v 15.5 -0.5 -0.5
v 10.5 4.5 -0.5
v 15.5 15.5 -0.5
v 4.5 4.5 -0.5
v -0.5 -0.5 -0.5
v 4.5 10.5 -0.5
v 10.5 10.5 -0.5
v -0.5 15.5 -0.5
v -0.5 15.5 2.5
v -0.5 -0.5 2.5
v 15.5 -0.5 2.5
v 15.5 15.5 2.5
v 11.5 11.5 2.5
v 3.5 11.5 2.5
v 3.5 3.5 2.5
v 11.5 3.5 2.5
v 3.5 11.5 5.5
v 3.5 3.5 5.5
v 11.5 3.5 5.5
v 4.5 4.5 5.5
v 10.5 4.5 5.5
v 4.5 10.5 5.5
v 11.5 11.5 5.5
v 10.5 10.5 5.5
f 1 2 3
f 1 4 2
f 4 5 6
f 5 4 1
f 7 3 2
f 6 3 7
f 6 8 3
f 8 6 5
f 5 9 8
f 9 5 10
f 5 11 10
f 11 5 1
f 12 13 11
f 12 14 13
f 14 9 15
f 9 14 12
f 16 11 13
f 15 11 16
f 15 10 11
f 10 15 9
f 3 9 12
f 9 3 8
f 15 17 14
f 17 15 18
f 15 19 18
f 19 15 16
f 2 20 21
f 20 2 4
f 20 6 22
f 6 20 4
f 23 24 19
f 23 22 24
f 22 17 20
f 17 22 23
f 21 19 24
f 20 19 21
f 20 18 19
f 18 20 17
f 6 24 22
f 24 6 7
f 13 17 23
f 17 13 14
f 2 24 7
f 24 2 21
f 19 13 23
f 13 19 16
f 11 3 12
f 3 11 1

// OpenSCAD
union() {
    translate([0, 0, 0]) color("brown") cube([1, 1, 1],center=true);
    translate([0, 0, 1]) color("brown") cube([1, 1, 1],center=true);
    translate([0, 0, 2]) color("brown") cube([1, 1, 1],center=true);
    translate([0, 1, 0]) color("brown") cube([1, 1, 1],center=true);
    translate([0, 1, 1]) color("brown") cube([1, 1, 1],center=true);
    translate([0, 1, 2]) color("brown") cube([1, 1, 1],center=true);
    translate([0, 2, 0]) color("brown") cube([1, 1, 1],center=true);
    translate([0, 2, 1]) color("brown") cube([1, 1, 1],center=true);
    translate([0, 2, 2]) color("brown") cube([1, 1, 1],center=true);
    translate([0, 3, 0]) color("brown") cube([1, 1, 1],center=true);
    translate([0, 3, 1]) color("brown") cube([1, 1, 1],center=true);
    translate([0, 3, 2]) color("brown") cube([1, 1, 1],center=true);
    translate([0, 4, 0]) color("brown") cube([1, 1, 1],center=true);
    translate([0, 4, 1]) color("brown") cube([1, 1, 1],center=true);
    translate([0, 4, 2]) color("brown") cube([1, 1, 1],center=true);
    translate([0, 5, 0]) color("brown") cube([1, 1, 1],center=true);
    translate([0, 5, 1]) color("brown") cube([1, 1, 1],center=true);
    translate([0, 5, 2]) color("brown") cube([1, 1, 1],center=true);
    translate([0, 6, 0]) color("brown") cube([1, 1, 1],center=true);
    translate([0, 6, 1]) color("brown") cube([1, 1, 1],center=true);
    translate([0, 6, 2]) color("brown") cube([1, 1, 1],center=true);
    translate([0, 7, 0]) color("brown") cube([1, 1, 1],center=true);
    translate([0, 7, 1]) color("brown") cube([1, 1, 1],center=true);
    translate([0, 7, 2]) color("brown") cube([1, 1, 1],center=true);
    translate([0, 8, 0]) color("brown") cube([1, 1, 1],center=true);
    translate([0, 8, 1]) color("brown") cube([1, 1, 1],center=true);
    translate([0, 8, 2]) color("brown") cube([1, 1, 1],center=true);
    translate([0, 9, 0]) color("brown") cube([1, 1, 1],center=true);
    translate([0, 9, 1]) color("brown") cube([1, 1, 1],center=true);
    translate([0, 9, 2]) color("brown") cube([1, 1, 1],center=true);
    translate([0, 10, 0]) color("brown") cube([1, 1, 1],center=true);
    translate([0, 10, 1]) color("brown") cube([1, 1, 1],center=true);
    translate([0, 10, 2]) color("brown") cube([1, 1, 1],center=true);
    translate([0, 11, 0]) color("brown") cube([1, 1, 1],center=true);
    translate([0, 11, 1]) color("brown") cube([1, 1, 1],center=true);
    translate([0, 11, 2]) color("brown") cube([1, 1, 1],center=true);
    translate([0, 12, 0]) color("brown") cube([1, 1, 1],center=true);
    translate([0, 12, 1]) color("brown") cube([1, 1, 1],center=true);
    translate([0, 12, 2]) color("brown") cube([1, 1, 1],center=true);
    translate([0, 13, 0]) color("brown") cube([1, 1, 1],center=true);
    translate([0, 13, 1]) color("brown") cube([1, 1, 1],center=true);
    translate([0, 13, 2]) color("brown") cube([1, 1, 1],center=true);
    translate([0, 14, 0]) color("brown") cube([1, 1, 1],center=true);
    translate([0, 14, 1]) color("brown") cube([1, 1, 1],center=true);
    translate([0, 14, 2]) color("brown") cube([1, 1, 1],center=true);
    translate([0, 15, 0]) color("brown") cube([1, 1, 1],center=true);
    translate([0, 15, 1]) color("brown") cube([1, 1, 1],center=true);
    translate([0, 15, 2]) color("brown") cube([1, 1, 1],center=true);
    translate([1, 0, 0]) color("brown") cube([1, 1, 1],center=true);
    translate([1, 0, 1]) color("brown") cube([1, 1, 1],center=true);
    translate([1, 0, 2]) color("brown") cube([1, 1, 1],center=true);
    translate([1, 1, 0]) color("brown") cube([1, 1, 1],center=true);
    translate([1, 1, 1]) color("brown") cube([1, 1, 1],center=true);
    translate([1, 1, 2]) color("brown") cube([1, 1, 1],center=true);
    translate([1, 2, 0]) color("brown") cube([1, 1, 1],center=true);
    translate([1, 2, 1]) color("brown") cube([1, 1, 1],center=true);
    translate([1, 2, 2]) color("brown") cube([1, 1, 1],center=true);
    translate([1, 3, 0]) color("brown") cube([1, 1, 1],center=true);
    translate([1, 3, 1]) color("brown") cube([1, 1, 1],center=true);
    translate([1, 3, 2]) color("brown") cube([1, 1, 1],center=true);
    translate([1, 4, 0]) color("brown") cube([1, 1, 1],center=true);
    translate([1, 4, 1]) color("brown") cube([1, 1, 1],center=true);
    translate([1, 4, 2]) color("brown") cube([1, 1, 1],center=true);
    translate([1, 5, 0]) color("brown") cube([1, 1, 1],center=true);
    translate([1, 5, 1]) color("brown") cube([1, 1, 1],center=true);
    translate([1, 5, 2]) color("brown") cube([1, 1, 1],center=true);
    translate([1, 6, 0]) color("brown") cube([1, 1, 1],center=true);
    translate([1, 6, 1]) color("brown") cube([1, 1, 1],center=true);
    translate([1, 6, 2]) color("brown") cube([1, 1, 1],center=true);
    translate([1, 7, 0]) color("brown") cube([1, 1, 1],center=true);
    translate([1, 7, 1]) color("brown") cube([1, 1, 1],center=true);
    translate([1, 7, 2]) color("brown") cube([1, 1, 1],center=true);
    translate([1, 8, 0]) color("brown") cube([1, 1, 1],center=true);
    translate([1, 8, 1]) color("brown") cube([1, 1, 1],center=true);
    translate([1, 8, 2]) color("brown") cube([1, 1, 1],center=true);
    translate([1, 9, 0]) color("brown") cube([1, 1, 1],center=true);
    translate([1, 9, 1]) color("brown") cube([1, 1, 1],center=true);
    translate([1, 9, 2]) color("brown") cube([1, 1, 1],center=true);
    translate([1, 10, 0]) color("brown") cube([1, 1, 1],center=true);
    translate([1, 10, 1]) color("brown") cube([1, 1, 1],center=true);
    translate([1, 10, 2]) color("brown") cube([1, 1, 1],center=true);
    translate([1, 11, 0]) color("brown") cube([1, 1, 1],center=true);
    translate([1, 11, 1]) color("brown") cube([1, 1, 1],center=true);
    translate([1, 11, 2]) color("brown") cube([1, 1, 1],center=true);
    translate([1, 12, 0]) color("brown") cube([1, 1, 1],center=true);
    translate([1, 12, 1]) color("brown") cube([1, 1, 1],center=true);
    translate([1, 12, 2]) color("brown") cube([1, 1, 1],center=true);
    translate([1, 13, 0]) color("brown") cube([1, 1, 1],center=true);
    translate([1, 13, 1]) color("brown") cube([1, 1, 1],center=true);
    translate([1, 13, 2]) color("brown") cube([1, 1, 1],center=true);
    translate([1, 14, 0]) color("brown") cube([1, 1, 1],center=true);
    translate([1, 14, 1]) color("brown") cube([1, 1, 1],center=true);
    translate([1, 14, 2]) color("brown") cube([1, 1, 1],center=true);
    translate([1, 15, 0]) color("brown") cube([1, 1, 1],center=true);
    translate([1, 15, 1]) color("brown") cube([1, 1, 1],center=true);
    translate([1, 15, 2]) color("brown") cube([1, 1, 1],center=true);
    translate([2, 0, 0]) color("brown") cube([1, 1, 1],center=true);
    translate([2, 0, 1]) color("brown") cube([1, 1, 1],center=true);
    translate([2, 0, 2]) color("brown") cube([1, 1, 1],center=true);
    translate([2, 1, 0]) color("brown") cube([1, 1, 1],center=true);
    translate([2, 1, 1]) color("brown") cube([1, 1, 1],center=true);
    translate([2, 1, 2]) color("brown") cube([1, 1, 1],center=true);
    translate([2, 2, 0]) color("brown") cube([1, 1, 1],center=true);
    translate([2, 2, 1]) color("brown") cube([1, 1, 1],center=true);
    translate([2, 2, 2]) color("brown") cube([1, 1, 1],center=true);
    translate([2, 3, 0]) color("brown") cube([1, 1, 1],center=true);
    translate([2, 3, 1]) color("brown") cube([1, 1, 1],center=true);
    translate([2, 3, 2]) color("brown") cube([1, 1, 1],center=true);
    translate([2, 4, 0]) color("brown") cube([1, 1, 1],center=true);
    translate([2, 4, 1]) color("brown") cube([1, 1, 1],center=true);
    translate([2, 4, 2]) color("brown") cube([1, 1, 1],center=true);
    translate([2, 5, 0]) color("brown") cube([1, 1, 1],center=true);
    translate([2, 5, 1]) color("brown") cube([1, 1, 1],center=true);
    translate([2, 5, 2]) color("brown") cube([1, 1, 1],center=true);
    translate([2, 6, 0]) color("brown") cube([1, 1, 1],center=true);
    translate([2, 6, 1]) color("brown") cube([1, 1, 1],center=true);
    translate([2, 6, 2]) color("brown") cube([1, 1, 1],center=true);
    translate([2, 7, 0]) color("brown") cube([1, 1, 1],center=true);
    translate([2, 7, 1]) color("brown") cube([1, 1, 1],center=true);
    translate([2, 7, 2]) color("brown") cube([1, 1, 1],center=true);
    translate([2, 8, 0]) color("brown") cube([1, 1, 1],center=true);
    translate([2, 8, 1]) color("brown") cube([1, 1, 1],center=true);
    translate([2, 8, 2]) color("brown") cube([1, 1, 1],center=true);
    translate([2, 9, 0]) color("brown") cube([1, 1, 1],center=true);
    translate([2, 9, 1]) color("brown") cube([1, 1, 1],center=true);
    translate([2, 9, 2]) color("brown") cube([1, 1, 1],center=true);
    translate([2, 10, 0]) color("brown") cube([1, 1, 1],center=true);
    translate([2, 10, 1]) color("brown") cube([1, 1, 1],center=true);
    translate([2, 10, 2]) color("brown") cube([1, 1, 1],center=true);
    translate([2, 11, 0]) color("brown") cube([1, 1, 1],center=true);
    translate([2, 11, 1]) color("brown") cube([1, 1, 1],center=true);
    translate([2, 11, 2]) color("brown") cube([1, 1, 1],center=true);
    translate([2, 12, 0]) color("brown") cube([1, 1, 1],center=true);
    translate([2, 12, 1]) color("brown") cube([1, 1, 1],center=true);
    translate([2, 12, 2]) color("brown") cube([1, 1, 1],center=true);
    translate([2, 13, 0]) color("brown") cube([1, 1, 1],center=true);
    translate([2, 13, 1]) color("brown") cube([1, 1, 1],center=true);
    translate([2, 13, 2]) color("brown") cube([1, 1, 1],center=true);
    translate([2, 14, 0]) color("brown") cube([1, 1, 1],center=true);
    translate([2, 14, 1]) color("brown") cube([1, 1, 1],center=true);
    translate([2, 14, 2]) color("brown") cube([1, 1, 1],center=true);
    translate([2, 15, 0]) color("brown") cube([1, 1, 1],center=true);
    translate([2, 15, 1]) color("brown") cube([1, 1, 1],center=true);
    translate([2, 15, 2]) color("brown") cube([1, 1, 1],center=true);
    translate([3, 0, 0]) color("brown") cube([1, 1, 1],center=true);
    translate([3, 0, 1]) color("brown") cube([1, 1, 1],center=true);
    translate([3, 0, 2]) color("brown") cube([1, 1, 1],center=true);
    translate([3, 1, 0]) color("brown") cube([1, 1, 1],center=true);
    translate([3, 1, 1]) color("brown") cube([1, 1, 1],center=true);
    translate([3, 1, 2]) color("brown") cube([1, 1, 1],center=true);
    translate([3, 2, 0]) color("brown") cube([1, 1, 1],center=true);
    translate([3, 2, 1]) color("brown") cube([1, 1, 1],center=true);
    translate([3, 2, 2]) color("brown") cube([1, 1, 1],center=true);
    translate([3, 3, 0]) color("brown") cube([1, 1, 1],center=true);
    translate([3, 3, 1]) color("brown") cube([1, 1, 1],center=true);
    translate([3, 3, 2]) color("brown") cube([1, 1, 1],center=true);
    translate([3, 4, 0]) color("brown") cube([1, 1, 1],center=true);
    translate([3, 4, 1]) color("brown") cube([1, 1, 1],center=true);
    translate([3, 4, 2]) color("brown") cube([1, 1, 1],center=true);
    translate([3, 5, 0]) color("brown") cube([1, 1, 1],center=true);
    translate([3, 5, 1]) color("brown") cube([1, 1, 1],center=true);
    translate([3, 5, 2]) color("brown") cube([1, 1, 1],center=true);
    translate([3, 6, 0]) color("brown") cube([1, 1, 1],center=true);
    translate([3, 6, 1]) color("brown") cube([1, 1, 1],center=true);
    translate([3, 6, 2]) color("brown") cube([1, 1, 1],center=true);
    translate([3, 7, 0]) color("brown") cube([1, 1, 1],center=true);
    translate([3, 7, 1]) color("brown") cube([1, 1, 1],center=true);
    translate([3, 7, 2]) color("brown") cube([1, 1, 1],center=true);
    translate([3, 8, 0]) color("brown") cube([1, 1, 1],center=true);
    translate([3, 8, 1]) color("brown") cube([1, 1, 1],center=true);
    translate([3, 8, 2]) color("brown") cube([1, 1, 1],center=true);
    translate([3, 9, 0]) color("brown") cube([1, 1, 1],center=true);
    translate([3, 9, 1]) color("brown") cube([1, 1, 1],center=true);
    translate([3, 9, 2]) color("brown") cube([1, 1, 1],center=true);
    translate([3, 10, 0]) color("brown") cube([1, 1, 1],center=true);
    translate([3, 10, 1]) color("brown") cube([1, 1, 1],center=true);
    translate([3, 10, 2]) color("brown") cube([1, 1, 1],center=true);
    translate([3, 11, 0]) color("brown") cube([1, 1, 1],center=true);
    translate([3, 11, 1]) color("brown") cube([1, 1, 1],center=true);
    translate([3, 11, 2]) color("brown") cube([1, 1, 1],center=true);
    translate([3, 12, 0]) color("brown") cube([1, 1, 1],center=true);
    translate([3, 12, 1]) color("brown") cube([1, 1, 1],center=true);
    translate([3, 12, 2]) color("brown") cube([1, 1, 1],center=true);
    translate([3, 13, 0]) color("brown") cube([1, 1, 1],center=true);
    translate([3, 13, 1]) color("brown") cube([1, 1, 1],center=true);
    translate([3, 13, 2]) color("brown") cube([1, 1, 1],center=true);
    translate([3, 14, 0]) color("brown") cube([1, 1, 1],center=true);
    translate([3, 14, 1]) color("brown") cube([1, 1, 1],center=true);
    translate([3, 14, 2]) color("brown") cube([1, 1, 1],center=true);
    translate([3, 15, 0]) color("brown") cube([1, 1, 1],center=true);
    translate([3, 15, 1]) color("brown") cube([1, 1, 1],center=true);
    translate([3, 15, 2]) color("brown") cube([1, 1, 1],center=true);
    translate([4, 0, 0]) color("brown") cube([1, 1, 1],center=true);
    translate([4, 0, 1]) color("brown") cube([1, 1, 1],center=true);
    translate([4, 0, 2]) color("brown") cube([1, 1, 1],center=true);
    translate([4, 1, 0]) color("brown") cube([1, 1, 1],center=true);
    translate([4, 1, 1]) color("brown") cube([1, 1, 1],center=true);
    translate([4, 1, 2]) color("brown") cube([1, 1, 1],center=true);
    translate([4, 2, 0]) color("brown") cube([1, 1, 1],center=true);
    translate([4, 2, 1]) color("brown") cube([1, 1, 1],center=true);
    translate([4, 2, 2]) color("brown") cube([1, 1, 1],center=true);
    translate([4, 3, 0]) color("brown") cube([1, 1, 1],center=true);
    translate([4, 3, 1]) color("brown") cube([1, 1, 1],center=true);
    translate([4, 3, 2]) color("brown") cube([1, 1, 1],center=true);
    translate([4, 4, 0]) color("brown") cube([1, 1, 1],center=true);
    translate([4, 4, 1]) color("brown") cube([1, 1, 1],center=true);
    translate([4, 4, 2]) color("brown") cube([1, 1, 1],center=true);
    translate([4, 4, 3]) color("brown") cube([1, 1, 1],center=true);
    translate([4, 4, 4]) color("brown") cube([1, 1, 1],center=true);
    translate([4, 4, 5]) color("brown") cube([1, 1, 1],center=true);
    translate([4, 5, 0]) color("brown") cube([1, 1, 1],center=true);
    translate([4, 5, 1]) color("brown") cube([1, 1, 1],center=true);
    translate([4, 5, 2]) color("brown") cube([1, 1, 1],center=true);
    translate([4, 5, 3]) color("brown") cube([1, 1, 1],center=true);
    translate([4, 5, 4]) color("brown") cube([1, 1, 1],center=true);
    translate([4, 5, 5]) color("brown") cube([1, 1, 1],center=true);
    translate([4, 6, 0]) color("brown") cube([1, 1, 1],center=true);
    translate([4, 6, 1]) color("brown") cube([1, 1, 1],center=true);
    translate([4, 6, 2]) color("brown") cube([1, 1, 1],center=true);
    translate([4, 6, 3]) color("brown") cube([1, 1, 1],center=true);
    translate([4, 6, 4]) color("brown") cube([1, 1, 1],center=true);
    translate([4, 6, 5]) color("brown") cube([1, 1, 1],center=true);
    translate([4, 7, 0]) color("brown") cube([1, 1, 1],center=true);
    translate([4, 7, 1]) color("brown") cube([1, 1, 1],center=true);
    translate([4, 7, 2]) color("brown") cube([1, 1, 1],center=true);
    translate([4, 7, 3]) color("brown") cube([1, 1, 1],center=true);
    translate([4, 7, 4]) color("brown") cube([1, 1, 1],center=true);
    translate([4, 7, 5]) color("brown") cube([1, 1, 1],center=true);
    translate([4, 8, 0]) color("brown") cube([1, 1, 1],center=true);
    translate([4, 8, 1]) color("brown") cube([1, 1, 1],center=true);
    translate([4, 8, 2]) color("brown") cube([1, 1, 1],center=true);
    translate([4, 8, 3]) color("brown") cube([1, 1, 1],center=true);
    translate([4, 8, 4]) color("brown") cube([1, 1, 1],center=true);
    translate([4, 8, 5]) color("brown") cube([1, 1, 1],center=true);
    translate([4, 9, 0]) color("brown") cube([1, 1, 1],center=true);
    translate([4, 9, 1]) color("brown") cube([1, 1, 1],center=true);
    translate([4, 9, 2]) color("brown") cube([1, 1, 1],center=true);
    translate([4, 9, 3]) color("brown") cube([1, 1, 1],center=true);
    translate([4, 9, 4]) color("brown") cube([1, 1, 1],center=true);
    translate([4, 9, 5]) color("brown") cube([1, 1, 1],center=true);
    translate([4, 10, 0]) color("brown") cube([1, 1, 1],center=true);
    translate([4, 10, 1]) color("brown") cube([1, 1, 1],center=true);
    translate([4, 10, 2]) color("brown") cube([1, 1, 1],center=true);
    translate([4, 10, 3]) color("brown") cube([1, 1, 1],center=true);
    translate([4, 10, 4]) color("brown") cube([1, 1, 1],center=true);
    translate([4, 10, 5]) color("brown") cube([1, 1, 1],center=true);
    translate([4, 11, 0]) color("brown") cube([1, 1, 1],center=true);
    translate([4, 11, 1]) color("brown") cube([1, 1, 1],center=true);
    translate([4, 11, 2]) color("brown") cube([1, 1, 1],center=true);
    translate([4, 11, 3]) color("brown") cube([1, 1, 1],center=true);
    translate([4, 11, 4]) color("brown") cube([1, 1, 1],center=true);
    translate([4, 11, 5]) color("brown") cube([1, 1, 1],center=true);
    translate([4, 12, 0]) color("brown") cube([1, 1, 1],center=true);
    translate([4, 12, 1]) color("brown") cube([1, 1, 1],center=true);
    translate([4, 12, 2]) color("brown") cube([1, 1, 1],center=true);
    translate([4, 13, 0]) color("brown") cube([1, 1, 1],center=true);
    translate([4, 13, 1]) color("brown") cube([1, 1, 1],center=true);
    translate([4, 13, 2]) color("brown") cube([1, 1, 1],center=true);
    translate([4, 14, 0]) color("brown") cube([1, 1, 1],center=true);
    translate([4, 14, 1]) color("brown") cube([1, 1, 1],center=true);
    translate([4, 14, 2]) color("brown") cube([1, 1, 1],center=true);
    translate([4, 15, 0]) color("brown") cube([1, 1, 1],center=true);
    translate([4, 15, 1]) color("brown") cube([1, 1, 1],center=true);
    translate([4, 15, 2]) color("brown") cube([1, 1, 1],center=true);
    translate([5, 0, 0]) color("brown") cube([1, 1, 1],center=true);
    translate([5, 0, 1]) color("brown") cube([1, 1, 1],center=true);
    translate([5, 0, 2]) color("brown") cube([1, 1, 1],center=true);
    translate([5, 1, 0]) color("brown") cube([1, 1, 1],center=true);
    translate([5, 1, 1]) color("brown") cube([1, 1, 1],center=true);
    translate([5, 1, 2]) color("brown") cube([1, 1, 1],center=true);
    translate([5, 2, 0]) color("brown") cube([1, 1, 1],center=true);
    translate([5, 2, 1]) color("brown") cube([1, 1, 1],center=true);
    translate([5, 2, 2]) color("brown") cube([1, 1, 1],center=true);
    translate([5, 3, 0]) color("brown") cube([1, 1, 1],center=true);
    translate([5, 3, 1]) color("brown") cube([1, 1, 1],center=true);
    translate([5, 3, 2]) color("brown") cube([1, 1, 1],center=true);
    translate([5, 4, 0]) color("brown") cube([1, 1, 1],center=true);
    translate([5, 4, 1]) color("brown") cube([1, 1, 1],center=true);
    translate([5, 4, 2]) color("brown") cube([1, 1, 1],center=true);
    translate([5, 4, 3]) color("brown") cube([1, 1, 1],center=true);
    translate([5, 4, 4]) color("brown") cube([1, 1, 1],center=true);
    translate([5, 4, 5]) color("brown") cube([1, 1, 1],center=true);
    translate([5, 11, 0]) color("brown") cube([1, 1, 1],center=true);
    translate([5, 11, 1]) color("brown") cube([1, 1, 1],center=true);
    translate([5, 11, 2]) color("brown") cube([1, 1, 1],center=true);
    translate([5, 11, 3]) color("brown") cube([1, 1, 1],center=true);
    translate([5, 11, 4]) color("brown") cube([1, 1, 1],center=true);
    translate([5, 11, 5]) color("brown") cube([1, 1, 1],center=true);
    translate([5, 12, 0]) color("brown") cube([1, 1, 1],center=true);
    translate([5, 12, 1]) color("brown") cube([1, 1, 1],center=true);
    translate([5, 12, 2]) color("brown") cube([1, 1, 1],center=true);
    translate([5, 13, 0]) color("brown") cube([1, 1, 1],center=true);
    translate([5, 13, 1]) color("brown") cube([1, 1, 1],center=true);
    translate([5, 13, 2]) color("brown") cube([1, 1, 1],center=true);
    translate([5, 14, 0]) color("brown") cube([1, 1, 1],center=true);
    translate([5, 14, 1]) color("brown") cube([1, 1, 1],center=true);
    translate([5, 14, 2]) color("brown") cube([1, 1, 1],center=true);
    translate([5, 15, 0]) color("brown") cube([1, 1, 1],center=true);
    translate([5, 15, 1]) color("brown") cube([1, 1, 1],center=true);
    translate([5, 15, 2]) color("brown") cube([1, 1, 1],center=true);
    translate([6, 0, 0]) color("brown") cube([1, 1, 1],center=true);
    translate([6, 0, 1]) color("brown") cube([1, 1, 1],center=true);
    translate([6, 0, 2]) color("brown") cube([1, 1, 1],center=true);
    translate([6, 1, 0]) color("brown") cube([1, 1, 1],center=true);
    translate([6, 1, 1]) color("brown") cube([1, 1, 1],center=true);
    translate([6, 1, 2]) color("brown") cube([1, 1, 1],center=true);
    translate([6, 2, 0]) color("brown") cube([1, 1, 1],center=true);
    translate([6, 2, 1]) color("brown") cube([1, 1, 1],center=true);
    translate([6, 2, 2]) color("brown") cube([1, 1, 1],center=true);
    translate([6, 3, 0]) color("brown") cube([1, 1, 1],center=true);
    translate([6, 3, 1]) color("brown") cube([1, 1, 1],center=true);
    translate([6, 3, 2]) color("brown") cube([1, 1, 1],center=true);
    translate([6, 4, 0]) color("brown") cube([1, 1, 1],center=true);
    translate([6, 4, 1]) color("brown") cube([1, 1, 1],center=true);
    translate([6, 4, 2]) color("brown") cube([1, 1, 1],center=true);
    translate([6, 4, 3]) color("brown") cube([1, 1, 1],center=true);
    translate([6, 4, 4]) color("brown") cube([1, 1, 1],center=true);
    translate([6, 4, 5]) color("brown") cube([1, 1, 1],center=true);
    translate([6, 11, 0]) color("brown") cube([1, 1, 1],center=true);
    translate([6, 11, 1]) color("brown") cube([1, 1, 1],center=true);
    translate([6, 11, 2]) color("brown") cube([1, 1, 1],center=true);
    translate([6, 11, 3]) color("brown") cube([1, 1, 1],center=true);
    translate([6, 11, 4]) color("brown") cube([1, 1, 1],center=true);
    translate([6, 11, 5]) color("brown") cube([1, 1, 1],center=true);
    translate([6, 12, 0]) color("brown") cube([1, 1, 1],center=true);
    translate([6, 12, 1]) color("brown") cube([1, 1, 1],center=true);
    translate([6, 12, 2]) color("brown") cube([1, 1, 1],center=true);
    translate([6, 13, 0]) color("brown") cube([1, 1, 1],center=true);
    translate([6, 13, 1]) color("brown") cube([1, 1, 1],center=true);
    translate([6, 13, 2]) color("brown") cube([1, 1, 1],center=true);
    translate([6, 14, 0]) color("brown") cube([1, 1, 1],center=true);
    translate([6, 14, 1]) color("brown") cube([1, 1, 1],center=true);
    translate([6, 14, 2]) color("brown") cube([1, 1, 1],center=true);
    translate([6, 15, 0]) color("brown") cube([1, 1, 1],center=true);
    translate([6, 15, 1]) color("brown") cube([1, 1, 1],center=true);
    translate([6, 15, 2]) color("brown") cube([1, 1, 1],center=true);
    translate([7, 0, 0]) color("brown") cube([1, 1, 1],center=true);
    translate([7, 0, 1]) color("brown") cube([1, 1, 1],center=true);
    translate([7, 0, 2]) color("brown") cube([1, 1, 1],center=true);
    translate([7, 1, 0]) color("brown") cube([1, 1, 1],center=true);
    translate([7, 1, 1]) color("brown") cube([1, 1, 1],center=true);
    translate([7, 1, 2]) color("brown") cube([1, 1, 1],center=true);
    translate([7, 2, 0]) color("brown") cube([1, 1, 1],center=true);
    translate([7, 2, 1]) color("brown") cube([1, 1, 1],center=true);
    translate([7, 2, 2]) color("brown") cube([1, 1, 1],center=true);
    translate([7, 3, 0]) color("brown") cube([1, 1, 1],center=true);
    translate([7, 3, 1]) color("brown") cube([1, 1, 1],center=true);
    translate([7, 3, 2]) color("brown") cube([1, 1, 1],center=true);
    translate([7, 4, 0]) color("brown") cube([1, 1, 1],center=true);
    translate([7, 4, 1]) color("brown") cube([1, 1, 1],center=true);
    translate([7, 4, 2]) color("brown") cube([1, 1, 1],center=true);
    translate([7, 4, 3]) color("brown") cube([1, 1, 1],center=true);
    translate([7, 4, 4]) color("brown") cube([1, 1, 1],center=true);
    translate([7, 4, 5]) color("brown") cube([1, 1, 1],center=true);
    translate([7, 11, 0]) color("brown") cube([1, 1, 1],center=true);
    translate([7, 11, 1]) color("brown") cube([1, 1, 1],center=true);
    translate([7, 11, 2]) color("brown") cube([1, 1, 1],center=true);
    translate([7, 11, 3]) color("brown") cube([1, 1, 1],center=true);
    translate([7, 11, 4]) color("brown") cube([1, 1, 1],center=true);
    translate([7, 11, 5]) color("brown") cube([1, 1, 1],center=true);
    translate([7, 12, 0]) color("brown") cube([1, 1, 1],center=true);
    translate([7, 12, 1]) color("brown") cube([1, 1, 1],center=true);
    translate([7, 12, 2]) color("brown") cube([1, 1, 1],center=true);
    translate([7, 13, 0]) color("brown") cube([1, 1, 1],center=true);
    translate([7, 13, 1]) color("brown") cube([1, 1, 1],center=true);
    translate([7, 13, 2]) color("brown") cube([1, 1, 1],center=true);
    translate([7, 14, 0]) color("brown") cube([1, 1, 1],center=true);
    translate([7, 14, 1]) color("brown") cube([1, 1, 1],center=true);
    translate([7, 14, 2]) color("brown") cube([1, 1, 1],center=true);
    translate([7, 15, 0]) color("brown") cube([1, 1, 1],center=true);
    translate([7, 15, 1]) color("brown") cube([1, 1, 1],center=true);
    translate([7, 15, 2]) color("brown") cube([1, 1, 1],center=true);
    translate([8, 0, 0]) color("brown") cube([1, 1, 1],center=true);
    translate([8, 0, 1]) color("brown") cube([1, 1, 1],center=true);
    translate([8, 0, 2]) color("brown") cube([1, 1, 1],center=true);
    translate([8, 1, 0]) color("brown") cube([1, 1, 1],center=true);
    translate([8, 1, 1]) color("brown") cube([1, 1, 1],center=true);
    translate([8, 1, 2]) color("brown") cube([1, 1, 1],center=true);
    translate([8, 2, 0]) color("brown") cube([1, 1, 1],center=true);
    translate([8, 2, 1]) color("brown") cube([1, 1, 1],center=true);
    translate([8, 2, 2]) color("brown") cube([1, 1, 1],center=true);
    translate([8, 3, 0]) color("brown") cube([1, 1, 1],center=true);
    translate([8, 3, 1]) color("brown") cube([1, 1, 1],center=true);
    translate([8, 3, 2]) color("brown") cube([1, 1, 1],center=true);
    translate([8, 4, 0]) color("brown") cube([1, 1, 1],center=true);
    translate([8, 4, 1]) color("brown") cube([1, 1, 1],center=true);
    translate([8, 4, 2]) color("brown") cube([1, 1, 1],center=true);
    translate([8, 4, 3]) color("brown") cube([1, 1, 1],center=true);
    translate([8, 4, 4]) color("brown") cube([1, 1, 1],center=true);
    translate([8, 4, 5]) color("brown") cube([1, 1, 1],center=true);
    translate([8, 11, 0]) color("brown") cube([1, 1, 1],center=true);
    translate([8, 11, 1]) color("brown") cube([1, 1, 1],center=true);
    translate([8, 11, 2]) color("brown") cube([1, 1, 1],center=true);
    translate([8, 11, 3]) color("brown") cube([1, 1, 1],center=true);
    translate([8, 11, 4]) color("brown") cube([1, 1, 1],center=true);
    translate([8, 11, 5]) color("brown") cube([1, 1, 1],center=true);
    translate([8, 12, 0]) color("brown") cube([1, 1, 1],center=true);
    translate([8, 12, 1]) color("brown") cube([1, 1, 1],center=true);
    translate([8, 12, 2]) color("brown") cube([1, 1, 1],center=true);
    translate([8, 13, 0]) color("brown") cube([1, 1, 1],center=true);
    translate([8, 13, 1]) color("brown") cube([1, 1, 1],center=true);
    translate([8, 13, 2]) color("brown") cube([1, 1, 1],center=true);
    translate([8, 14, 0]) color("brown") cube([1, 1, 1],center=true);
    translate([8, 14, 1]) color("brown") cube([1, 1, 1],center=true);
    translate([8, 14, 2]) color("brown") cube([1, 1, 1],center=true);
    translate([8, 15, 0]) color("brown") cube([1, 1, 1],center=true);
    translate([8, 15, 1]) color("brown") cube([1, 1, 1],center=true);
    translate([8, 15, 2]) color("brown") cube([1, 1, 1],center=true);
    translate([9, 0, 0]) color("brown") cube([1, 1, 1],center=true);
    translate([9, 0, 1]) color("brown") cube([1, 1, 1],center=true);
    translate([9, 0, 2]) color("brown") cube([1, 1, 1],center=true);
    translate([9, 1, 0]) color("brown") cube([1, 1, 1],center=true);
    translate([9, 1, 1]) color("brown") cube([1, 1, 1],center=true);
    translate([9, 1, 2]) color("brown") cube([1, 1, 1],center=true);
    translate([9, 2, 0]) color("brown") cube([1, 1, 1],center=true);
    translate([9, 2, 1]) color("brown") cube([1, 1, 1],center=true);
    translate([9, 2, 2]) color("brown") cube([1, 1, 1],center=true);
    translate([9, 3, 0]) color("brown") cube([1, 1, 1],center=true);
    translate([9, 3, 1]) color("brown") cube([1, 1, 1],center=true);
    translate([9, 3, 2]) color("brown") cube([1, 1, 1],center=true);
    translate([9, 4, 0]) color("brown") cube([1, 1, 1],center=true);
    translate([9, 4, 1]) color("brown") cube([1, 1, 1],center=true);
    translate([9, 4, 2]) color("brown") cube([1, 1, 1],center=true);
    translate([9, 4, 3]) color("brown") cube([1, 1, 1],center=true);
    translate([9, 4, 4]) color("brown") cube([1, 1, 1],center=true);
    translate([9, 4, 5]) color("brown") cube([1, 1, 1],center=true);
    translate([9, 11, 0]) color("brown") cube([1, 1, 1],center=true);
    translate([9, 11, 1]) color("brown") cube([1, 1, 1],center=true);
    translate([9, 11, 2]) color("brown") cube([1, 1, 1],center=true);
    translate([9, 11, 3]) color("brown") cube([1, 1, 1],center=true);
    translate([9, 11, 4]) color("brown") cube([1, 1, 1],center=true);
    translate([9, 11, 5]) color("brown") cube([1, 1, 1],center=true);
    translate([9, 12, 0]) color("brown") cube([1, 1, 1],center=true);
    translate([9, 12, 1]) color("brown") cube([1, 1, 1],center=true);
    translate([9, 12, 2]) color("brown") cube([1, 1, 1],center=true);
    translate([9, 13, 0]) color("brown") cube([1, 1, 1],center=true);
    translate([9, 13, 1]) color("brown") cube([1, 1, 1],center=true);
    translate([9, 13, 2]) color("brown") cube([1, 1, 1],center=true);
    translate([9, 14, 0]) color("brown") cube([1, 1, 1],center=true);
    translate([9, 14, 1]) color("brown") cube([1, 1, 1],center=true);
    translate([9, 14, 2]) color("brown") cube([1, 1, 1],center=true);
    translate([9, 15, 0]) color("brown") cube([1, 1, 1],center=true);
    translate([9, 15, 1]) color("brown") cube([1, 1, 1],center=true);
    translate([9, 15, 2]) color("brown") cube([1, 1, 1],center=true);
    translate([10, 0, 0]) color("brown") cube([1, 1, 1],center=true);
    translate([10, 0, 1]) color("brown") cube([1, 1, 1],center=true);
    translate([10, 0, 2]) color("brown") cube([1, 1, 1],center=true);
    translate([10, 1, 0]) color("brown") cube([1, 1, 1],center=true);
    translate([10, 1, 1]) color("brown") cube([1, 1, 1],center=true);
    translate([10, 1, 2]) color("brown") cube([1, 1, 1],center=true);
    translate([10, 2, 0]) color("brown") cube([1, 1, 1],center=true);
    translate([10, 2, 1]) color("brown") cube([1, 1, 1],center=true);
    translate([10, 2, 2]) color("brown") cube([1, 1, 1],center=true);
    translate([10, 3, 0]) color("brown") cube([1, 1, 1],center=true);
    translate([10, 3, 1]) color("brown") cube([1, 1, 1],center=true);
    translate([10, 3, 2]) color("brown") cube([1, 1, 1],center=true);
    translate([10, 4, 0]) color("brown") cube([1, 1, 1],center=true);
    translate([10, 4, 1]) color("brown") cube([1, 1, 1],center=true);
    translate([10, 4, 2]) color("brown") cube([1, 1, 1],center=true);
    translate([10, 4, 3]) color("brown") cube([1, 1, 1],center=true);
    translate([10, 4, 4]) color("brown") cube([1, 1, 1],center=true);
    translate([10, 4, 5]) color("brown") cube([1, 1, 1],center=true);
    translate([10, 11, 0]) color("brown") cube([1, 1, 1],center=true);
    translate([10, 11, 1]) color("brown") cube([1, 1, 1],center=true);
    translate([10, 11, 2]) color("brown") cube([1, 1, 1],center=true);
    translate([10, 11, 3]) color("brown") cube([1, 1, 1],center=true);
    translate([10, 11, 4]) color("brown") cube([1, 1, 1],center=true);
    translate([10, 11, 5]) color("brown") cube([1, 1, 1],center=true);
    translate([10, 12, 0]) color("brown") cube([1, 1, 1],center=true);
    translate([10, 12, 1]) color("brown") cube([1, 1, 1],center=true);
    translate([10, 12, 2]) color("brown") cube([1, 1, 1],center=true);
    translate([10, 13, 0]) color("brown") cube([1, 1, 1],center=true);
    translate([10, 13, 1]) color("brown") cube([1, 1, 1],center=true);
    translate([10, 13, 2]) color("brown") cube([1, 1, 1],center=true);
    translate([10, 14, 0]) color("brown") cube([1, 1, 1],center=true);
    translate([10, 14, 1]) color("brown") cube([1, 1, 1],center=true);
    translate([10, 14, 2]) color("brown") cube([1, 1, 1],center=true);
    translate([10, 15, 0]) color("brown") cube([1, 1, 1],center=true);
    translate([10, 15, 1]) color("brown") cube([1, 1, 1],center=true);
    translate([10, 15, 2]) color("brown") cube([1, 1, 1],center=true);
    translate([11, 0, 0]) color("brown") cube([1, 1, 1],center=true);
    translate([11, 0, 1]) color("brown") cube([1, 1, 1],center=true);
    translate([11, 0, 2]) color("brown") cube([1, 1, 1],center=true);
    translate([11, 1, 0]) color("brown") cube([1, 1, 1],center=true);
    translate([11, 1, 1]) color("brown") cube([1, 1, 1],center=true);
    translate([11, 1, 2]) color("brown") cube([1, 1, 1],center=true);
    translate([11, 2, 0]) color("brown") cube([1, 1, 1],center=true);
    translate([11, 2, 1]) color("brown") cube([1, 1, 1],center=true);
    translate([11, 2, 2]) color("brown") cube([1, 1, 1],center=true);
    translate([11, 3, 0]) color("brown") cube([1, 1, 1],center=true);
    translate([11, 3, 1]) color("brown") cube([1, 1, 1],center=true);
    translate([11, 3, 2]) color("brown") cube([1, 1, 1],center=true);
    translate([11, 4, 0]) color("brown") cube([1, 1, 1],center=true);
    translate([11, 4, 1]) color("brown") cube([1, 1, 1],center=true);
    translate([11, 4, 2]) color("brown") cube([1, 1, 1],center=true);
    translate([11, 4, 3]) color("brown") cube([1, 1, 1],center=true);
    translate([11, 4, 4]) color("brown") cube([1, 1, 1],center=true);
    translate([11, 4, 5]) color("brown") cube([1, 1, 1],center=true);
    translate([11, 5, 0]) color("brown") cube([1, 1, 1],center=true);
    translate([11, 5, 1]) color("brown") cube([1, 1, 1],center=true);
    translate([11, 5, 2]) color("brown") cube([1, 1, 1],center=true);
    translate([11, 5, 3]) color("brown") cube([1, 1, 1],center=true);
    translate([11, 5, 4]) color("brown") cube([1, 1, 1],center=true);
    translate([11, 5, 5]) color("brown") cube([1, 1, 1],center=true);
    translate([11, 6, 0]) color("brown") cube([1, 1, 1],center=true);
    translate([11, 6, 1]) color("brown") cube([1, 1, 1],center=true);
    translate([11, 6, 2]) color("brown") cube([1, 1, 1],center=true);
    translate([11, 6, 3]) color("brown") cube([1, 1, 1],center=true);
    translate([11, 6, 4]) color("brown") cube([1, 1, 1],center=true);
    translate([11, 6, 5]) color("brown") cube([1, 1, 1],center=true);
    translate([11, 7, 0]) color("brown") cube([1, 1, 1],center=true);
    translate([11, 7, 1]) color("brown") cube([1, 1, 1],center=true);
    translate([11, 7, 2]) color("brown") cube([1, 1, 1],center=true);
    translate([11, 7, 3]) color("brown") cube([1, 1, 1],center=true);
    translate([11, 7, 4]) color("brown") cube([1, 1, 1],center=true);
    translate([11, 7, 5]) color("brown") cube([1, 1, 1],center=true);
    translate([11, 8, 0]) color("brown") cube([1, 1, 1],center=true);
    translate([11, 8, 1]) color("brown") cube([1, 1, 1],center=true);
    translate([11, 8, 2]) color("brown") cube([1, 1, 1],center=true);
    translate([11, 8, 3]) color("brown") cube([1, 1, 1],center=true);
    translate([11, 8, 4]) color("brown") cube([1, 1, 1],center=true);
    translate([11, 8, 5]) color("brown") cube([1, 1, 1],center=true);
    translate([11, 9, 0]) color("brown") cube([1, 1, 1],center=true);
    translate([11, 9, 1]) color("brown") cube([1, 1, 1],center=true);
    translate([11, 9, 2]) color("brown") cube([1, 1, 1],center=true);
    translate([11, 9, 3]) color("brown") cube([1, 1, 1],center=true);
    translate([11, 9, 4]) color("brown") cube([1, 1, 1],center=true);
    translate([11, 9, 5]) color("brown") cube([1, 1, 1],center=true);
    translate([11, 10, 0]) color("brown") cube([1, 1, 1],center=true);
    translate([11, 10, 1]) color("brown") cube([1, 1, 1],center=true);
    translate([11, 10, 2]) color("brown") cube([1, 1, 1],center=true);
    translate([11, 10, 3]) color("brown") cube([1, 1, 1],center=true);
    translate([11, 10, 4]) color("brown") cube([1, 1, 1],center=true);
    translate([11, 10, 5]) color("brown") cube([1, 1, 1],center=true);
    translate([11, 11, 0]) color("brown") cube([1, 1, 1],center=true);
    translate([11, 11, 1]) color("brown") cube([1, 1, 1],center=true);
    translate([11, 11, 2]) color("brown") cube([1, 1, 1],center=true);
    translate([11, 11, 3]) color("brown") cube([1, 1, 1],center=true);
    translate([11, 11, 4]) color("brown") cube([1, 1, 1],center=true);
    translate([11, 11, 5]) color("brown") cube([1, 1, 1],center=true);
    translate([11, 12, 0]) color("brown") cube([1, 1, 1],center=true);
    translate([11, 12, 1]) color("brown") cube([1, 1, 1],center=true);
    translate([11, 12, 2]) color("brown") cube([1, 1, 1],center=true);
    translate([11, 13, 0]) color("brown") cube([1, 1, 1],center=true);
    translate([11, 13, 1]) color("brown") cube([1, 1, 1],center=true);
    translate([11, 13, 2]) color("brown") cube([1, 1, 1],center=true);
    translate([11, 14, 0]) color("brown") cube([1, 1, 1],center=true);
    translate([11, 14, 1]) color("brown") cube([1, 1, 1],center=true);
    translate([11, 14, 2]) color("brown") cube([1, 1, 1],center=true);
    translate([11, 15, 0]) color("brown") cube([1, 1, 1],center=true);
    translate([11, 15, 1]) color("brown") cube([1, 1, 1],center=true);
    translate([11, 15, 2]) color("brown") cube([1, 1, 1],center=true);
    translate([12, 0, 0]) color("brown") cube([1, 1, 1],center=true);
    translate([12, 0, 1]) color("brown") cube([1, 1, 1],center=true);
    translate([12, 0, 2]) color("brown") cube([1, 1, 1],center=true);
    translate([12, 1, 0]) color("brown") cube([1, 1, 1],center=true);
    translate([12, 1, 1]) color("brown") cube([1, 1, 1],center=true);
    translate([12, 1, 2]) color("brown") cube([1, 1, 1],center=true);
    translate([12, 2, 0]) color("brown") cube([1, 1, 1],center=true);
    translate([12, 2, 1]) color("brown") cube([1, 1, 1],center=true);
    translate([12, 2, 2]) color("brown") cube([1, 1, 1],center=true);
    translate([12, 3, 0]) color("brown") cube([1, 1, 1],center=true);
    translate([12, 3, 1]) color("brown") cube([1, 1, 1],center=true);
    translate([12, 3, 2]) color("brown") cube([1, 1, 1],center=true);
    translate([12, 4, 0]) color("brown") cube([1, 1, 1],center=true);
    translate([12, 4, 1]) color("brown") cube([1, 1, 1],center=true);
    translate([12, 4, 2]) color("brown") cube([1, 1, 1],center=true);
    translate([12, 5, 0]) color("brown") cube([1, 1, 1],center=true);
    translate([12, 5, 1]) color("brown") cube([1, 1, 1],center=true);
    translate([12, 5, 2]) color("brown") cube([1, 1, 1],center=true);
    translate([12, 6, 0]) color("brown") cube([1, 1, 1],center=true);
    translate([12, 6, 1]) color("brown") cube([1, 1, 1],center=true);
    translate([12, 6, 2]) color("brown") cube([1, 1, 1],center=true);
    translate([12, 7, 0]) color("brown") cube([1, 1, 1],center=true);
    translate([12, 7, 1]) color("brown") cube([1, 1, 1],center=true);
    translate([12, 7, 2]) color("brown") cube([1, 1, 1],center=true);
    translate([12, 8, 0]) color("brown") cube([1, 1, 1],center=true);
    translate([12, 8, 1]) color("brown") cube([1, 1, 1],center=true);
    translate([12, 8, 2]) color("brown") cube([1, 1, 1],center=true);
    translate([12, 9, 0]) color("brown") cube([1, 1, 1],center=true);
    translate([12, 9, 1]) color("brown") cube([1, 1, 1],center=true);
    translate([12, 9, 2]) color("brown") cube([1, 1, 1],center=true);
    translate([12, 10, 0]) color("brown") cube([1, 1, 1],center=true);
    translate([12, 10, 1]) color("brown") cube([1, 1, 1],center=true);
    translate([12, 10, 2]) color("brown") cube([1, 1, 1],center=true);
    translate([12, 11, 0]) color("brown") cube([1, 1, 1],center=true);
    translate([12, 11, 1]) color("brown") cube([1, 1, 1],center=true);
    translate([12, 11, 2]) color("brown") cube([1, 1, 1],center=true);
    translate([12, 12, 0]) color("brown") cube([1, 1, 1],center=true);
    translate([12, 12, 1]) color("brown") cube([1, 1, 1],center=true);
    translate([12, 12, 2]) color("brown") cube([1, 1, 1],center=true);
    translate([12, 13, 0]) color("brown") cube([1, 1, 1],center=true);
    translate([12, 13, 1]) color("brown") cube([1, 1, 1],center=true);
    translate([12, 13, 2]) color("brown") cube([1, 1, 1],center=true);
    translate([12, 14, 0]) color("brown") cube([1, 1, 1],center=true);
    translate([12, 14, 1]) color("brown") cube([1, 1, 1],center=true);
    translate([12, 14, 2]) color("brown") cube([1, 1, 1],center=true);
    translate([12, 15, 0]) color("brown") cube([1, 1, 1],center=true);
    translate([12, 15, 1]) color("brown") cube([1, 1, 1],center=true);
    translate([12, 15, 2]) color("brown") cube([1, 1, 1],center=true);
    translate([13, 0, 0]) color("brown") cube([1, 1, 1],center=true);
    translate([13, 0, 1]) color("brown") cube([1, 1, 1],center=true);
    translate([13, 0, 2]) color("brown") cube([1, 1, 1],center=true);
    translate([13, 1, 0]) color("brown") cube([1, 1, 1],center=true);
    translate([13, 1, 1]) color("brown") cube([1, 1, 1],center=true);
    translate([13, 1, 2]) color("brown") cube([1, 1, 1],center=true);
    translate([13, 2, 0]) color("brown") cube([1, 1, 1],center=true);
    translate([13, 2, 1]) color("brown") cube([1, 1, 1],center=true);
    translate([13, 2, 2]) color("brown") cube([1, 1, 1],center=true);
    translate([13, 3, 0]) color("brown") cube([1, 1, 1],center=true);
    translate([13, 3, 1]) color("brown") cube([1, 1, 1],center=true);
    translate([13, 3, 2]) color("brown") cube([1, 1, 1],center=true);
    translate([13, 4, 0]) color("brown") cube([1, 1, 1],center=true);
    translate([13, 4, 1]) color("brown") cube([1, 1, 1],center=true);
    translate([13, 4, 2]) color("brown") cube([1, 1, 1],center=true);
    translate([13, 5, 0]) color("brown") cube([1, 1, 1],center=true);
    translate([13, 5, 1]) color("brown") cube([1, 1, 1],center=true);
    translate([13, 5, 2]) color("brown") cube([1, 1, 1],center=true);
    translate([13, 6, 0]) color("brown") cube([1, 1, 1],center=true);
    translate([13, 6, 1]) color("brown") cube([1, 1, 1],center=true);
    translate([13, 6, 2]) color("brown") cube([1, 1, 1],center=true);
    translate([13, 7, 0]) color("brown") cube([1, 1, 1],center=true);
    translate([13, 7, 1]) color("brown") cube([1, 1, 1],center=true);
    translate([13, 7, 2]) color("brown") cube([1, 1, 1],center=true);
    translate([13, 8, 0]) color("brown") cube([1, 1, 1],center=true);
    translate([13, 8, 1]) color("brown") cube([1, 1, 1],center=true);
    translate([13, 8, 2]) color("brown") cube([1, 1, 1],center=true);
    translate([13, 9, 0]) color("brown") cube([1, 1, 1],center=true);
    translate([13, 9, 1]) color("brown") cube([1, 1, 1],center=true);
    translate([13, 9, 2]) color("brown") cube([1, 1, 1],center=true);
    translate([13, 10, 0]) color("brown") cube([1, 1, 1],center=true);
    translate([13, 10, 1]) color("brown") cube([1, 1, 1],center=true);
    translate([13, 10, 2]) color("brown") cube([1, 1, 1],center=true);
    translate([13, 11, 0]) color("brown") cube([1, 1, 1],center=true);
    translate([13, 11, 1]) color("brown") cube([1, 1, 1],center=true);
    translate([13, 11, 2]) color("brown") cube([1, 1, 1],center=true);
    translate([13, 12, 0]) color("brown") cube([1, 1, 1],center=true);
    translate([13, 12, 1]) color("brown") cube([1, 1, 1],center=true);
    translate([13, 12, 2]) color("brown") cube([1, 1, 1],center=true);
    translate([13, 13, 0]) color("brown") cube([1, 1, 1],center=true);
    translate([13, 13, 1]) color("brown") cube([1, 1, 1],center=true);
    translate([13, 13, 2]) color("brown") cube([1, 1, 1],center=true);
    translate([13, 14, 0]) color("brown") cube([1, 1, 1],center=true);
    translate([13, 14, 1]) color("brown") cube([1, 1, 1],center=true);
    translate([13, 14, 2]) color("brown") cube([1, 1, 1],center=true);
    translate([13, 15, 0]) color("brown") cube([1, 1, 1],center=true);
    translate([13, 15, 1]) color("brown") cube([1, 1, 1],center=true);
    translate([13, 15, 2]) color("brown") cube([1, 1, 1],center=true);
    translate([14, 0, 0]) color("brown") cube([1, 1, 1],center=true);
    translate([14, 0, 1]) color("brown") cube([1, 1, 1],center=true);
    translate([14, 0, 2]) color("brown") cube([1, 1, 1],center=true);
    translate([14, 1, 0]) color("brown") cube([1, 1, 1],center=true);
    translate([14, 1, 1]) color("brown") cube([1, 1, 1],center=true);
    translate([14, 1, 2]) color("brown") cube([1, 1, 1],center=true);
    translate([14, 2, 0]) color("brown") cube([1, 1, 1],center=true);
    translate([14, 2, 1]) color("brown") cube([1, 1, 1],center=true);
    translate([14, 2, 2]) color("brown") cube([1, 1, 1],center=true);
    translate([14, 3, 0]) color("brown") cube([1, 1, 1],center=true);
    translate([14, 3, 1]) color("brown") cube([1, 1, 1],center=true);
    translate([14, 3, 2]) color("brown") cube([1, 1, 1],center=true);
    translate([14, 4, 0]) color("brown") cube([1, 1, 1],center=true);
    translate([14, 4, 1]) color("brown") cube([1, 1, 1],center=true);
    translate([14, 4, 2]) color("brown") cube([1, 1, 1],center=true);
    translate([14, 5, 0]) color("brown") cube([1, 1, 1],center=true);
    translate([14, 5, 1]) color("brown") cube([1, 1, 1],center=true);
    translate([14, 5, 2]) color("brown") cube([1, 1, 1],center=true);
    translate([14, 6, 0]) color("brown") cube([1, 1, 1],center=true);
    translate([14, 6, 1]) color("brown") cube([1, 1, 1],center=true);
    translate([14, 6, 2]) color("brown") cube([1, 1, 1],center=true);
    translate([14, 7, 0]) color("brown") cube([1, 1, 1],center=true);
    translate([14, 7, 1]) color("brown") cube([1, 1, 1],center=true);
    translate([14, 7, 2]) color("brown") cube([1, 1, 1],center=true);
    translate([14, 8, 0]) color("brown") cube([1, 1, 1],center=true);
    translate([14, 8, 1]) color("brown") cube([1, 1, 1],center=true);
    translate([14, 8, 2]) color("brown") cube([1, 1, 1],center=true);
    translate([14, 9, 0]) color("brown") cube([1, 1, 1],center=true);
    translate([14, 9, 1]) color("brown") cube([1, 1, 1],center=true);
    translate([14, 9, 2]) color("brown") cube([1, 1, 1],center=true);
    translate([14, 10, 0]) color("brown") cube([1, 1, 1],center=true);
    translate([14, 10, 1]) color("brown") cube([1, 1, 1],center=true);
    translate([14, 10, 2]) color("brown") cube([1, 1, 1],center=true);
    translate([14, 11, 0]) color("brown") cube([1, 1, 1],center=true);
    translate([14, 11, 1]) color("brown") cube([1, 1, 1],center=true);
    translate([14, 11, 2]) color("brown") cube([1, 1, 1],center=true);
    translate([14, 12, 0]) color("brown") cube([1, 1, 1],center=true);
    translate([14, 12, 1]) color("brown") cube([1, 1, 1],center=true);
    translate([14, 12, 2]) color("brown") cube([1, 1, 1],center=true);
    translate([14, 13, 0]) color("brown") cube([1, 1, 1],center=true);
    translate([14, 13, 1]) color("brown") cube([1, 1, 1],center=true);
    translate([14, 13, 2]) color("brown") cube([1, 1, 1],center=true);
    translate([14, 14, 0]) color("brown") cube([1, 1, 1],center=true);
    translate([14, 14, 1]) color("brown") cube([1, 1, 1],center=true);
    translate([14, 14, 2]) color("brown") cube([1, 1, 1],center=true);
    translate([14, 15, 0]) color("brown") cube([1, 1, 1],center=true);
    translate([14, 15, 1]) color("brown") cube([1, 1, 1],center=true);
    translate([14, 15, 2]) color("brown") cube([1, 1, 1],center=true);
    translate([15, 0, 0]) color("brown") cube([1, 1, 1],center=true);
    translate([15, 0, 1]) color("brown") cube([1, 1, 1],center=true);
    translate([15, 0, 2]) color("brown") cube([1, 1, 1],center=true);
    translate([15, 1, 0]) color("brown") cube([1, 1, 1],center=true);
    translate([15, 1, 1]) color("brown") cube([1, 1, 1],center=true);
    translate([15, 1, 2]) color("brown") cube([1, 1, 1],center=true);
    translate([15, 2, 0]) color("brown") cube([1, 1, 1],center=true);
    translate([15, 2, 1]) color("brown") cube([1, 1, 1],center=true);
    translate([15, 2, 2]) color("brown") cube([1, 1, 1],center=true);
    translate([15, 3, 0]) color("brown") cube([1, 1, 1],center=true);
    translate([15, 3, 1]) color("brown") cube([1, 1, 1],center=true);
    translate([15, 3, 2]) color("brown") cube([1, 1, 1],center=true);
    translate([15, 4, 0]) color("brown") cube([1, 1, 1],center=true);
    translate([15, 4, 1]) color("brown") cube([1, 1, 1],center=true);
    translate([15, 4, 2]) color("brown") cube([1, 1, 1],center=true);
    translate([15, 5, 0]) color("brown") cube([1, 1, 1],center=true);
    translate([15, 5, 1]) color("brown") cube([1, 1, 1],center=true);
    translate([15, 5, 2]) color("brown") cube([1, 1, 1],center=true);
    translate([15, 6, 0]) color("brown") cube([1, 1, 1],center=true);
    translate([15, 6, 1]) color("brown") cube([1, 1, 1],center=true);
    translate([15, 6, 2]) color("brown") cube([1, 1, 1],center=true);
    translate([15, 7, 0]) color("brown") cube([1, 1, 1],center=true);
    translate([15, 7, 1]) color("brown") cube([1, 1, 1],center=true);
    translate([15, 7, 2]) color("brown") cube([1, 1, 1],center=true);
    translate([15, 8, 0]) color("brown") cube([1, 1, 1],center=true);
    translate([15, 8, 1]) color("brown") cube([1, 1, 1],center=true);
    translate([15, 8, 2]) color("brown") cube([1, 1, 1],center=true);
    translate([15, 9, 0]) color("brown") cube([1, 1, 1],center=true);
    translate([15, 9, 1]) color("brown") cube([1, 1, 1],center=true);
    translate([15, 9, 2]) color("brown") cube([1, 1, 1],center=true);
    translate([15, 10, 0]) color("brown") cube([1, 1, 1],center=true);
    translate([15, 10, 1]) color("brown") cube([1, 1, 1],center=true);
    translate([15, 10, 2]) color("brown") cube([1, 1, 1],center=true);
    translate([15, 11, 0]) color("brown") cube([1, 1, 1],center=true);
    translate([15, 11, 1]) color("brown") cube([1, 1, 1],center=true);
    translate([15, 11, 2]) color("brown") cube([1, 1, 1],center=true);
    translate([15, 12, 0]) color("brown") cube([1, 1, 1],center=true);
    translate([15, 12, 1]) color("brown") cube([1, 1, 1],center=true);
    translate([15, 12, 2]) color("brown") cube([1, 1, 1],center=true);
    translate([15, 13, 0]) color("brown") cube([1, 1, 1],center=true);
    translate([15, 13, 1]) color("brown") cube([1, 1, 1],center=true);
    translate([15, 13, 2]) color("brown") cube([1, 1, 1],center=true);
    translate([15, 14, 0]) color("brown") cube([1, 1, 1],center=true);
    translate([15, 14, 1]) color("brown") cube([1, 1, 1],center=true);
    translate([15, 14, 2]) color("brown") cube([1, 1, 1],center=true);
    translate([15, 15, 0]) color("brown") cube([1, 1, 1],center=true);
    translate([15, 15, 1]) color("brown") cube([1, 1, 1],center=true);
    translate([15, 15, 2]) color("brown") cube([1, 1, 1],center=true);
}
